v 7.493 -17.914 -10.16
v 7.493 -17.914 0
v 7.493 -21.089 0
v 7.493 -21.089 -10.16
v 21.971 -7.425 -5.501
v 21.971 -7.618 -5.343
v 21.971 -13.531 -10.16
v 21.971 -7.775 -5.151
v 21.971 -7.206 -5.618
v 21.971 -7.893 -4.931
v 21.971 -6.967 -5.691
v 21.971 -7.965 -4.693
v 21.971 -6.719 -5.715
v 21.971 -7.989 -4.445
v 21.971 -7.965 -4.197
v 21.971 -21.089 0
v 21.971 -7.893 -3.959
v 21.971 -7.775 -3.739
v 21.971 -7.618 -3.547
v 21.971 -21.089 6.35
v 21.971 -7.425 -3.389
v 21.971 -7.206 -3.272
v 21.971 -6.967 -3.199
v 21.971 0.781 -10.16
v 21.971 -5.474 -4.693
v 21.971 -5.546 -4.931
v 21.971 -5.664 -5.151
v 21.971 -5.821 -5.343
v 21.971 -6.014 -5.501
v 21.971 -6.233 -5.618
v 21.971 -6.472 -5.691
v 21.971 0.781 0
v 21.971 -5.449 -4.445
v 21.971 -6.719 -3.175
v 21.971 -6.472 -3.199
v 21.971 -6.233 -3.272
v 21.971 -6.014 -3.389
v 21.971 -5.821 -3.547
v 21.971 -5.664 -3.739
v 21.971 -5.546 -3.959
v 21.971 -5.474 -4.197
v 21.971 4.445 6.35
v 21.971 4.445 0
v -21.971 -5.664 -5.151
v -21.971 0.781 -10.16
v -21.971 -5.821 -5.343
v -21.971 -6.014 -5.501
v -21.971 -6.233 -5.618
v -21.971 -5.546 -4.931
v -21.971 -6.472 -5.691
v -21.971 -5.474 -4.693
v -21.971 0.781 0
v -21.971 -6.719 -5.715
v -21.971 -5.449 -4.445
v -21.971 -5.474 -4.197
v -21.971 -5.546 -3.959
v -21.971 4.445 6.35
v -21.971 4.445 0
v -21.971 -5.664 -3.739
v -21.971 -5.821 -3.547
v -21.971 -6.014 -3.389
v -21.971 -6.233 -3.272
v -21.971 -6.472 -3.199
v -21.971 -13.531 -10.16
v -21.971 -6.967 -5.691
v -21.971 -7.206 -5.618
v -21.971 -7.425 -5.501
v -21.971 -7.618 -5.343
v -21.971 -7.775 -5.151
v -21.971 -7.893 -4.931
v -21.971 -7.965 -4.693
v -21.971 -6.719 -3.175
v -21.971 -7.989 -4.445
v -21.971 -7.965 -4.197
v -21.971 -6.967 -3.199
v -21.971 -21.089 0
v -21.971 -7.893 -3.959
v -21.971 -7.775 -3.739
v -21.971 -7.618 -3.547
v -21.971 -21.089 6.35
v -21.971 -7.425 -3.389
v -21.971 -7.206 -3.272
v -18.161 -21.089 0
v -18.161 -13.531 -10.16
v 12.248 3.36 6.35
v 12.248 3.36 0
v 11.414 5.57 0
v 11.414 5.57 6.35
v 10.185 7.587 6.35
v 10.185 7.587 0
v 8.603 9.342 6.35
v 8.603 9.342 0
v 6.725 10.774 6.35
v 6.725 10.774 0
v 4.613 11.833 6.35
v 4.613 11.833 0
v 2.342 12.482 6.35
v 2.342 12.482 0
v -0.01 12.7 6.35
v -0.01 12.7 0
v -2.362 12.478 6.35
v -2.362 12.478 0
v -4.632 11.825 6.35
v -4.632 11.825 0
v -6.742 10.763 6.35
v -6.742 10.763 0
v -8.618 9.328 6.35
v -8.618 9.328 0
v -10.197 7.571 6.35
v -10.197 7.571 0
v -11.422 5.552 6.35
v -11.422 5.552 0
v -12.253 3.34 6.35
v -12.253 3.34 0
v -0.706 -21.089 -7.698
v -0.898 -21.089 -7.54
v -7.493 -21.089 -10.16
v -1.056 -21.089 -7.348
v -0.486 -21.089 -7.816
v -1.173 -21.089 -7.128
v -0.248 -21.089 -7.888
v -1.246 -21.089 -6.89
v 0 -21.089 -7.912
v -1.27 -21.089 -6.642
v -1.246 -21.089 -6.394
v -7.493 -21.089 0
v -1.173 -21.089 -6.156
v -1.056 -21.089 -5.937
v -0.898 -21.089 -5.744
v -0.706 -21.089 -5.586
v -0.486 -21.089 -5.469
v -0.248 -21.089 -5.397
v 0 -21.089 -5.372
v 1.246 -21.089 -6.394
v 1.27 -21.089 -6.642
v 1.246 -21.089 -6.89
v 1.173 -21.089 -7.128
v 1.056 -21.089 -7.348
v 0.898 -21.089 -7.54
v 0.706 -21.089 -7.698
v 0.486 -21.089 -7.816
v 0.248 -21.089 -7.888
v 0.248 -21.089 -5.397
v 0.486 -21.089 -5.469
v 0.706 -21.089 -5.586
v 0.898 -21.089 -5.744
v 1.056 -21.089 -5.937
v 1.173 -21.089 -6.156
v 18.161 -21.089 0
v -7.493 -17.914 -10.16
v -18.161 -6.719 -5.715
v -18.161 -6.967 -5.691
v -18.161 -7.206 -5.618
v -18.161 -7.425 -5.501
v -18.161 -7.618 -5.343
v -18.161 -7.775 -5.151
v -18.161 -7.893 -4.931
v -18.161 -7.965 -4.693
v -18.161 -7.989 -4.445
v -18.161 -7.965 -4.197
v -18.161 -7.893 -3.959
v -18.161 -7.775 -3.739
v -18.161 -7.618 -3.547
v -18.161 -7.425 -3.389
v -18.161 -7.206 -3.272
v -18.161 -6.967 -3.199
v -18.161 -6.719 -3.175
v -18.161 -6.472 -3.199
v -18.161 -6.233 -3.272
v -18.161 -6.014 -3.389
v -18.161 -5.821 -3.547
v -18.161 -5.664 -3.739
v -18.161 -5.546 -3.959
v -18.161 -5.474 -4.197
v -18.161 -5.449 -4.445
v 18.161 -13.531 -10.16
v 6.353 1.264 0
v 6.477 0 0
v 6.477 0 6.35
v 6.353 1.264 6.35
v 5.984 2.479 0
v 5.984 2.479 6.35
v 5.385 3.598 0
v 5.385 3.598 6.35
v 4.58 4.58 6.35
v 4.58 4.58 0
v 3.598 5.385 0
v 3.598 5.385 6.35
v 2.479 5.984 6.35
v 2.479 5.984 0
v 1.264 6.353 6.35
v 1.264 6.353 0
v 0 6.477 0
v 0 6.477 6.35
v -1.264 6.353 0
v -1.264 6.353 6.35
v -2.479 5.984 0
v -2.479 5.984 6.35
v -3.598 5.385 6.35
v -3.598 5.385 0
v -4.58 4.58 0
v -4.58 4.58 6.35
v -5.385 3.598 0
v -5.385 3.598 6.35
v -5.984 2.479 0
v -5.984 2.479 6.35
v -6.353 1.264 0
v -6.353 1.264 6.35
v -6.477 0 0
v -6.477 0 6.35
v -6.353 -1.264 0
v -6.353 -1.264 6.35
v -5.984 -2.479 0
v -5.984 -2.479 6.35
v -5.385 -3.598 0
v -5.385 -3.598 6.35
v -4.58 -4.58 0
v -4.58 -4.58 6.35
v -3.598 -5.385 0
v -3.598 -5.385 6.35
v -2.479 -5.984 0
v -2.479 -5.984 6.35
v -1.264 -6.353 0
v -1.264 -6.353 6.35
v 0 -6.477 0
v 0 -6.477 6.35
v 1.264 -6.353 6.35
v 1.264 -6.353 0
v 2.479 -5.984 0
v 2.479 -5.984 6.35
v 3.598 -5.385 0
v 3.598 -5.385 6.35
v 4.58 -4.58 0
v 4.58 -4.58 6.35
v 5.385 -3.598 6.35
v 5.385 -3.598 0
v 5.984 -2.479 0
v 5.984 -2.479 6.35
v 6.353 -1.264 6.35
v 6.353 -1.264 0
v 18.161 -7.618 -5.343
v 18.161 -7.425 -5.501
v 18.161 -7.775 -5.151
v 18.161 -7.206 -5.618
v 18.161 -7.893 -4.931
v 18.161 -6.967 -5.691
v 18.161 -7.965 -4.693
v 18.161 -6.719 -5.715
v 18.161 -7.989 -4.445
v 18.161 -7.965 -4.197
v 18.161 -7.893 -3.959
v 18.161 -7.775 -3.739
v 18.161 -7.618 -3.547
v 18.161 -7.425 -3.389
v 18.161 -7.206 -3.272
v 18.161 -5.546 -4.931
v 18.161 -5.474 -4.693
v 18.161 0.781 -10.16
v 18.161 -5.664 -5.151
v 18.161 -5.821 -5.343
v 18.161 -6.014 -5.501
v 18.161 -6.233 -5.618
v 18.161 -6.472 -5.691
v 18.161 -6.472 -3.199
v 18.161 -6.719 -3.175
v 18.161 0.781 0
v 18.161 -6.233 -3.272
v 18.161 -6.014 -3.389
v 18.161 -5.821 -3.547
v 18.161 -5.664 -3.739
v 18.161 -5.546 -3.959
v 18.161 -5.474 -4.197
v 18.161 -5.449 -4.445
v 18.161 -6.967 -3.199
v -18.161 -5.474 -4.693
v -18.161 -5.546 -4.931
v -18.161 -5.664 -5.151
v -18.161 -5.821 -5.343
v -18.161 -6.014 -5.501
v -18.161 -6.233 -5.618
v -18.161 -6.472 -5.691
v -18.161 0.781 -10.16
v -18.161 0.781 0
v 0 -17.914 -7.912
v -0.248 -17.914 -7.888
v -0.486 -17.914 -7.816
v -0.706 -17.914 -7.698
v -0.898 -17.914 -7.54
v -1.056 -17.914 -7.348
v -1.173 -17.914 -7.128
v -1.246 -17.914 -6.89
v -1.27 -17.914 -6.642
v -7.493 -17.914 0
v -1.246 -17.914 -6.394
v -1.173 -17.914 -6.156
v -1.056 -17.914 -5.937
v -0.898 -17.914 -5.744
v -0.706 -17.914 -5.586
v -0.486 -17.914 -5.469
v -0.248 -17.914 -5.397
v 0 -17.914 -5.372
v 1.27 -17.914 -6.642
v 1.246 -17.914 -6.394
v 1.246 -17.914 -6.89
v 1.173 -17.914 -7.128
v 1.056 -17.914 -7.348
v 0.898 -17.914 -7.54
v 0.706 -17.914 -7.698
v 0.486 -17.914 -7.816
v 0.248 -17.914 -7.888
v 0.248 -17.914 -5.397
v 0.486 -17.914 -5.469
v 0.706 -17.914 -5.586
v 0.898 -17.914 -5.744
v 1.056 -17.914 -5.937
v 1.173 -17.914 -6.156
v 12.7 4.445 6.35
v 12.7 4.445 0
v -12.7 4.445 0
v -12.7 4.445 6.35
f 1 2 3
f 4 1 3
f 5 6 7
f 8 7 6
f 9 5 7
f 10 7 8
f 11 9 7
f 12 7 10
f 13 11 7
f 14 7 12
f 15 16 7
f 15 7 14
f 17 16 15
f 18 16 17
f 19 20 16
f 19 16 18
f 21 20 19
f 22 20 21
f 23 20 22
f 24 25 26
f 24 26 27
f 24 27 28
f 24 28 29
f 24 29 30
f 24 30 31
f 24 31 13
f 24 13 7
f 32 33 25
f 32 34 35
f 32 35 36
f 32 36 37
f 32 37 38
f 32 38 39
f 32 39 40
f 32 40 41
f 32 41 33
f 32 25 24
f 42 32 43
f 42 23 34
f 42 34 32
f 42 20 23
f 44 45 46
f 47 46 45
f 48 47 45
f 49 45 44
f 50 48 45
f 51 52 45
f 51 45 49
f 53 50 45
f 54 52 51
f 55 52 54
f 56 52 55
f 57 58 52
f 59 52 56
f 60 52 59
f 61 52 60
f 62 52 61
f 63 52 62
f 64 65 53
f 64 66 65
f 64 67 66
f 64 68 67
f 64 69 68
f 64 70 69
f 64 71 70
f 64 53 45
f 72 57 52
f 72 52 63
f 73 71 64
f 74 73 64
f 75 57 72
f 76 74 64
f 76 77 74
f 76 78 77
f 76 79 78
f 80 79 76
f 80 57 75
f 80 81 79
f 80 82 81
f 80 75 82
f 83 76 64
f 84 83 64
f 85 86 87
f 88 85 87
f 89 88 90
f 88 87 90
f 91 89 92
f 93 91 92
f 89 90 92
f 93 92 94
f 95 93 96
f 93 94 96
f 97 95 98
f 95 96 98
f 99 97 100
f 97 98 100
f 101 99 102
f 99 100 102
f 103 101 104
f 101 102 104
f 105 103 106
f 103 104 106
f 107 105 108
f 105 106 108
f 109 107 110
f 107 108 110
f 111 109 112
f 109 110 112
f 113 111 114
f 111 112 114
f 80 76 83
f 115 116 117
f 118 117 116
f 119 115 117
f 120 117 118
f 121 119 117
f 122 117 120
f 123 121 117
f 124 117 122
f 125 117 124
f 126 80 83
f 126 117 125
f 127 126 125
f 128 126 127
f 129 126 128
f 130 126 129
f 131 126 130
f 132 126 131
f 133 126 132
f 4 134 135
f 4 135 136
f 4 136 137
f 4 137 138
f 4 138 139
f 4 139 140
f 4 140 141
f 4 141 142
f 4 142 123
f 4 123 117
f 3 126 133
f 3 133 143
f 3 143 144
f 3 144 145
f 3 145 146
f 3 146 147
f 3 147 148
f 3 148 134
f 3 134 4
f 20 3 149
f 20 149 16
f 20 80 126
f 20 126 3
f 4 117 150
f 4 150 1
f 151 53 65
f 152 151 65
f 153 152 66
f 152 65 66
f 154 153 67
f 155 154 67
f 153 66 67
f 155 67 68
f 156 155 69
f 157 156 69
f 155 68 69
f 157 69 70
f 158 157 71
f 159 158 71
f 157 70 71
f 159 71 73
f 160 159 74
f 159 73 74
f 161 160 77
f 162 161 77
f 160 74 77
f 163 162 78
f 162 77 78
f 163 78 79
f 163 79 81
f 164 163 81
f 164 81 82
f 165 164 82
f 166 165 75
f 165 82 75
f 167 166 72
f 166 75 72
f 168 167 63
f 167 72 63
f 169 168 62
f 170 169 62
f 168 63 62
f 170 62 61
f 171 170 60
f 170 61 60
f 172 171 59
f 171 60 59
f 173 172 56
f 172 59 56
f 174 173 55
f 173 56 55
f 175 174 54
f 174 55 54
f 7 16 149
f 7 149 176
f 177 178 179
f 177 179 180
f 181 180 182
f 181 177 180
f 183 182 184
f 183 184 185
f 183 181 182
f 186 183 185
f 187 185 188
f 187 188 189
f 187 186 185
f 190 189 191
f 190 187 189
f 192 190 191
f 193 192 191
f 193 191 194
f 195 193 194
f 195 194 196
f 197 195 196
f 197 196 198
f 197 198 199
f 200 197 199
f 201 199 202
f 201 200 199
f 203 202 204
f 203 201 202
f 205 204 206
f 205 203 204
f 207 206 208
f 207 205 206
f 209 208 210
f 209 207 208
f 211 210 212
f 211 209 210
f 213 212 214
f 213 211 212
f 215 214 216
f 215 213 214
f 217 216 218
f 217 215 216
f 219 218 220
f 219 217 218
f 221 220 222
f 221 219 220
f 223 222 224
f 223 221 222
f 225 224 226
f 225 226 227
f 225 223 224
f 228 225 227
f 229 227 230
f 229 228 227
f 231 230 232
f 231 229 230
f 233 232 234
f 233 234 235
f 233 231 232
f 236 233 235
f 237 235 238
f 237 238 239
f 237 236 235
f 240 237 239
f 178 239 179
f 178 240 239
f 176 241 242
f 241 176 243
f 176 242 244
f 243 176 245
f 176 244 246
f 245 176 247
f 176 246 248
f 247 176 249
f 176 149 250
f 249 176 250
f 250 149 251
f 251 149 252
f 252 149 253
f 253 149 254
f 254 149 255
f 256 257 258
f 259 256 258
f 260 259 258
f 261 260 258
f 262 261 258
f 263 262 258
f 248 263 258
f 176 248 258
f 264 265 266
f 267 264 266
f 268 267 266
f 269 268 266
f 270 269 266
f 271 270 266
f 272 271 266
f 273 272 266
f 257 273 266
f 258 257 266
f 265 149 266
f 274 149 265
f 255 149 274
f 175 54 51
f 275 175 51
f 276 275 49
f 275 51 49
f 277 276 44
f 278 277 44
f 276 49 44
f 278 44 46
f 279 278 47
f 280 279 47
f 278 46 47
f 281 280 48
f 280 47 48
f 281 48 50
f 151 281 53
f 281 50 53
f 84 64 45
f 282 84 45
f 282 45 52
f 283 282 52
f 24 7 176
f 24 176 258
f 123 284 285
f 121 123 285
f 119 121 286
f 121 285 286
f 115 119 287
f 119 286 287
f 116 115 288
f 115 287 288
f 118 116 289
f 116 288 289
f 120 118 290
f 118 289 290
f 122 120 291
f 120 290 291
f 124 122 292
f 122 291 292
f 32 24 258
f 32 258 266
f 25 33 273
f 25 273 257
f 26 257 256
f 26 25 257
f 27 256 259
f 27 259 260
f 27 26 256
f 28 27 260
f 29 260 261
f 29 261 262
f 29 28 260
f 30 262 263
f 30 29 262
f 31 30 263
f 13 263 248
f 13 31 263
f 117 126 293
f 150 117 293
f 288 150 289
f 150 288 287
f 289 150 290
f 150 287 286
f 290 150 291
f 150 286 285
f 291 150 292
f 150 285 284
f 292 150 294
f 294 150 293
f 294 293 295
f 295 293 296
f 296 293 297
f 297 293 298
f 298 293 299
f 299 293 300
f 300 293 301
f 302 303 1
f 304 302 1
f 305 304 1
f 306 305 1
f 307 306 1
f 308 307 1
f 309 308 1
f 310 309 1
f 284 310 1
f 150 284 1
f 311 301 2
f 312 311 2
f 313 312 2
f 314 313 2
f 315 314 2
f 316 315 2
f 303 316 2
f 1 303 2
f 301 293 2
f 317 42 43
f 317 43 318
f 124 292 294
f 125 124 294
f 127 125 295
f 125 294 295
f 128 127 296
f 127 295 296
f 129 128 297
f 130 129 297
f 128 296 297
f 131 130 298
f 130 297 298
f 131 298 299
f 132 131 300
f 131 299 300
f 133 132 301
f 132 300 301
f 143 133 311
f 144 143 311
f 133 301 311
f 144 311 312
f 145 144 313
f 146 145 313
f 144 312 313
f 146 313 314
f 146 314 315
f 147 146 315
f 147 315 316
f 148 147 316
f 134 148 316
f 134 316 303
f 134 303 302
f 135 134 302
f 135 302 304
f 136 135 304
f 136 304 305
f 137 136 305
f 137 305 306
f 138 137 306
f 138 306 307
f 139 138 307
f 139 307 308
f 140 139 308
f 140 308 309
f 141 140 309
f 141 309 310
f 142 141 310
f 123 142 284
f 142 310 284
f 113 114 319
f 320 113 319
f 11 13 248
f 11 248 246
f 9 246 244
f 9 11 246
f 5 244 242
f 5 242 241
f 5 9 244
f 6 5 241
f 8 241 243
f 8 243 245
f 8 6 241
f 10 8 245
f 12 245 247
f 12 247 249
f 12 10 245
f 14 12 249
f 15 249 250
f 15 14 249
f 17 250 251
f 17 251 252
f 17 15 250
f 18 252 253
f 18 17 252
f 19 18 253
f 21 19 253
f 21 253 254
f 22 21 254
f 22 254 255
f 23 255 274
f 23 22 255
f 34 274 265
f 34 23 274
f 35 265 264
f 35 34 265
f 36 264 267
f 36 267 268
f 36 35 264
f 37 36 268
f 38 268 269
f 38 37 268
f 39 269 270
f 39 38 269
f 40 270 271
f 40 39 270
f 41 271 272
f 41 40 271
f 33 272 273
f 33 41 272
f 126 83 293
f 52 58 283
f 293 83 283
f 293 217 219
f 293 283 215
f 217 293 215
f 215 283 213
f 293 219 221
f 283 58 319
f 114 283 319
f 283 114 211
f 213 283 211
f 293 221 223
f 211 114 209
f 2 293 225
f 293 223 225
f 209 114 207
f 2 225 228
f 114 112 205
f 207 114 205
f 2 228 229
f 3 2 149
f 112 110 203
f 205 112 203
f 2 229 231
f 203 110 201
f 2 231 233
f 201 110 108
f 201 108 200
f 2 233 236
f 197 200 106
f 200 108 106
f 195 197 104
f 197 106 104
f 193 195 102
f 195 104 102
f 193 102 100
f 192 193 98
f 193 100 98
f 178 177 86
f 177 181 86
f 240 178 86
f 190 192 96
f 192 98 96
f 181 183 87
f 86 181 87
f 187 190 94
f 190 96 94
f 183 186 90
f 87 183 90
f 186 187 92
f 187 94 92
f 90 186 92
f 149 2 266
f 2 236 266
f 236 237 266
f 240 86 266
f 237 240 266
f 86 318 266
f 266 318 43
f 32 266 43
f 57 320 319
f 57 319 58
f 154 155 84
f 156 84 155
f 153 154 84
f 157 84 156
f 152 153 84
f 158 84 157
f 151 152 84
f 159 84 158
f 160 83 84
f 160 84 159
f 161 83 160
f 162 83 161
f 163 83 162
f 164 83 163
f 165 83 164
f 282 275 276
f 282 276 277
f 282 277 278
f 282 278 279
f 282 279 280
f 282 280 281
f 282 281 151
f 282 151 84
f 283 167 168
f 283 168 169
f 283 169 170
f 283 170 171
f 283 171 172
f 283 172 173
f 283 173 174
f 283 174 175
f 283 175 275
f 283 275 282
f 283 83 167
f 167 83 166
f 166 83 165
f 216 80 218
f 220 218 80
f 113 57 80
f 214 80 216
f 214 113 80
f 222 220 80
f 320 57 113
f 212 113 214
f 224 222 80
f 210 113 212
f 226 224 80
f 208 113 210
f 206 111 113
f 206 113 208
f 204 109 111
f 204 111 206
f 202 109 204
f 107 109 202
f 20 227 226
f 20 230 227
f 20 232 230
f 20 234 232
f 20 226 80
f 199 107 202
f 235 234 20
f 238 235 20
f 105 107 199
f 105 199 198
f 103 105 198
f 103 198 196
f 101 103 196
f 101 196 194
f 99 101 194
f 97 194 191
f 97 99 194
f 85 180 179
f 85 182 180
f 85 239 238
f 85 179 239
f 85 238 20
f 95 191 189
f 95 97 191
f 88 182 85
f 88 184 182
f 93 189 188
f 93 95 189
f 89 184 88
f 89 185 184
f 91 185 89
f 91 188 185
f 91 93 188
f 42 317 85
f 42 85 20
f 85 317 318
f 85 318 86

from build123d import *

# Parameters (mm, degrees)
F0_R     = 12.7
F0_R_2   = 6.477
F1_DEPTH = 6.35
F3_DEPTH = 6.35
F5_DEPTH = 3.81
F7_DEPTH = 10.16
F9_DEPTH = 25.4


# Not quite as in the source:
# - a pattern or mirror of a feature is missing from the dataset's text; its kind, count and spacing are read off the source's solid


with BuildPart() as f1:
    # F0 (on Top) → F1 (new body)
    with BuildSketch(Plane.XY):
        Circle(F0_R)
        Circle(F0_R_2, mode=Mode.SUBTRACT)
    extrude(amount=F1_DEPTH)

    # F2 (on face) → F3 (join)
    with BuildSketch(Plane.XY.offset(6.35)):
        Polygon((-21.971, -21.0888834), (0, -21.0888834), (21.971, -21.0888834), (21.971, -17.9138834), (21.971, 4.445), (12.7, 4.445), (6.7730685696, -9.7721947122), (-6.9460314699, -9.7721947122), (-12.7, 4.445), (-21.971, 4.445), (-21.971, -17.907), align=None)
    extrude(amount=-F3_DEPTH)

    # F4 (on face) → F5 (join)
    with BuildSketch(Plane.YZ.offset(21.971)):
        Polygon((0.7805166, 6.35), (-21.0888834, 6.35), (-21.0888834, 0), (-13.5309724137, -10.16), (-6.7194938, -10.16), (0.7805166, -10.16), align=None)
        with BuildLine():
            ThreePointArc((-5.4494938, -4.445), (-5.8214681879, -5.3430256121), (-6.7194938, -5.715))
            ThreePointArc((-6.7194938, -5.715), (-7.6175194121, -3.5469743879), (-5.4494938, -4.445))
        make_face(mode=Mode.SUBTRACT)
    f5 = extrude(amount=-F5_DEPTH)

    # F5_copies: F5 across plane
    add(f5.mirror(Plane(origin=(0, 0, 0), x_dir=(0, 0, -1), z_dir=(-1, 0, 0))))

    # F6 (on face) → F7 (join)
    with BuildSketch(Plane(origin=(0, 0, 0), x_dir=(1, 0, 0), z_dir=(0, 0, -1))):
        Polygon((7.493, 21.0888834), (0, 21.0888834), (-7.493, 21.0888834), (-7.493, 17.9138834), (7.493, 17.9138834), align=None)
    extrude(amount=F7_DEPTH)

    # F8 (on face) → F9 (cut)
    with BuildSketch(Plane(origin=(0, -17.9138834, 0), x_dir=(-1, 0, 0), z_dir=(0, 1, 0))):
        with BuildLine():
            ThreePointArc((0, -7.912179098), (0.8980256121, -7.5402047101), (1.27, -6.642179098))
            ThreePointArc((1.27, -6.642179098), (-0.8980256121, -5.7441534859), (0, -7.912179098))
        make_face()
    extrude(amount=-F9_DEPTH, mode=Mode.SUBTRACT)


solid = f1.part
